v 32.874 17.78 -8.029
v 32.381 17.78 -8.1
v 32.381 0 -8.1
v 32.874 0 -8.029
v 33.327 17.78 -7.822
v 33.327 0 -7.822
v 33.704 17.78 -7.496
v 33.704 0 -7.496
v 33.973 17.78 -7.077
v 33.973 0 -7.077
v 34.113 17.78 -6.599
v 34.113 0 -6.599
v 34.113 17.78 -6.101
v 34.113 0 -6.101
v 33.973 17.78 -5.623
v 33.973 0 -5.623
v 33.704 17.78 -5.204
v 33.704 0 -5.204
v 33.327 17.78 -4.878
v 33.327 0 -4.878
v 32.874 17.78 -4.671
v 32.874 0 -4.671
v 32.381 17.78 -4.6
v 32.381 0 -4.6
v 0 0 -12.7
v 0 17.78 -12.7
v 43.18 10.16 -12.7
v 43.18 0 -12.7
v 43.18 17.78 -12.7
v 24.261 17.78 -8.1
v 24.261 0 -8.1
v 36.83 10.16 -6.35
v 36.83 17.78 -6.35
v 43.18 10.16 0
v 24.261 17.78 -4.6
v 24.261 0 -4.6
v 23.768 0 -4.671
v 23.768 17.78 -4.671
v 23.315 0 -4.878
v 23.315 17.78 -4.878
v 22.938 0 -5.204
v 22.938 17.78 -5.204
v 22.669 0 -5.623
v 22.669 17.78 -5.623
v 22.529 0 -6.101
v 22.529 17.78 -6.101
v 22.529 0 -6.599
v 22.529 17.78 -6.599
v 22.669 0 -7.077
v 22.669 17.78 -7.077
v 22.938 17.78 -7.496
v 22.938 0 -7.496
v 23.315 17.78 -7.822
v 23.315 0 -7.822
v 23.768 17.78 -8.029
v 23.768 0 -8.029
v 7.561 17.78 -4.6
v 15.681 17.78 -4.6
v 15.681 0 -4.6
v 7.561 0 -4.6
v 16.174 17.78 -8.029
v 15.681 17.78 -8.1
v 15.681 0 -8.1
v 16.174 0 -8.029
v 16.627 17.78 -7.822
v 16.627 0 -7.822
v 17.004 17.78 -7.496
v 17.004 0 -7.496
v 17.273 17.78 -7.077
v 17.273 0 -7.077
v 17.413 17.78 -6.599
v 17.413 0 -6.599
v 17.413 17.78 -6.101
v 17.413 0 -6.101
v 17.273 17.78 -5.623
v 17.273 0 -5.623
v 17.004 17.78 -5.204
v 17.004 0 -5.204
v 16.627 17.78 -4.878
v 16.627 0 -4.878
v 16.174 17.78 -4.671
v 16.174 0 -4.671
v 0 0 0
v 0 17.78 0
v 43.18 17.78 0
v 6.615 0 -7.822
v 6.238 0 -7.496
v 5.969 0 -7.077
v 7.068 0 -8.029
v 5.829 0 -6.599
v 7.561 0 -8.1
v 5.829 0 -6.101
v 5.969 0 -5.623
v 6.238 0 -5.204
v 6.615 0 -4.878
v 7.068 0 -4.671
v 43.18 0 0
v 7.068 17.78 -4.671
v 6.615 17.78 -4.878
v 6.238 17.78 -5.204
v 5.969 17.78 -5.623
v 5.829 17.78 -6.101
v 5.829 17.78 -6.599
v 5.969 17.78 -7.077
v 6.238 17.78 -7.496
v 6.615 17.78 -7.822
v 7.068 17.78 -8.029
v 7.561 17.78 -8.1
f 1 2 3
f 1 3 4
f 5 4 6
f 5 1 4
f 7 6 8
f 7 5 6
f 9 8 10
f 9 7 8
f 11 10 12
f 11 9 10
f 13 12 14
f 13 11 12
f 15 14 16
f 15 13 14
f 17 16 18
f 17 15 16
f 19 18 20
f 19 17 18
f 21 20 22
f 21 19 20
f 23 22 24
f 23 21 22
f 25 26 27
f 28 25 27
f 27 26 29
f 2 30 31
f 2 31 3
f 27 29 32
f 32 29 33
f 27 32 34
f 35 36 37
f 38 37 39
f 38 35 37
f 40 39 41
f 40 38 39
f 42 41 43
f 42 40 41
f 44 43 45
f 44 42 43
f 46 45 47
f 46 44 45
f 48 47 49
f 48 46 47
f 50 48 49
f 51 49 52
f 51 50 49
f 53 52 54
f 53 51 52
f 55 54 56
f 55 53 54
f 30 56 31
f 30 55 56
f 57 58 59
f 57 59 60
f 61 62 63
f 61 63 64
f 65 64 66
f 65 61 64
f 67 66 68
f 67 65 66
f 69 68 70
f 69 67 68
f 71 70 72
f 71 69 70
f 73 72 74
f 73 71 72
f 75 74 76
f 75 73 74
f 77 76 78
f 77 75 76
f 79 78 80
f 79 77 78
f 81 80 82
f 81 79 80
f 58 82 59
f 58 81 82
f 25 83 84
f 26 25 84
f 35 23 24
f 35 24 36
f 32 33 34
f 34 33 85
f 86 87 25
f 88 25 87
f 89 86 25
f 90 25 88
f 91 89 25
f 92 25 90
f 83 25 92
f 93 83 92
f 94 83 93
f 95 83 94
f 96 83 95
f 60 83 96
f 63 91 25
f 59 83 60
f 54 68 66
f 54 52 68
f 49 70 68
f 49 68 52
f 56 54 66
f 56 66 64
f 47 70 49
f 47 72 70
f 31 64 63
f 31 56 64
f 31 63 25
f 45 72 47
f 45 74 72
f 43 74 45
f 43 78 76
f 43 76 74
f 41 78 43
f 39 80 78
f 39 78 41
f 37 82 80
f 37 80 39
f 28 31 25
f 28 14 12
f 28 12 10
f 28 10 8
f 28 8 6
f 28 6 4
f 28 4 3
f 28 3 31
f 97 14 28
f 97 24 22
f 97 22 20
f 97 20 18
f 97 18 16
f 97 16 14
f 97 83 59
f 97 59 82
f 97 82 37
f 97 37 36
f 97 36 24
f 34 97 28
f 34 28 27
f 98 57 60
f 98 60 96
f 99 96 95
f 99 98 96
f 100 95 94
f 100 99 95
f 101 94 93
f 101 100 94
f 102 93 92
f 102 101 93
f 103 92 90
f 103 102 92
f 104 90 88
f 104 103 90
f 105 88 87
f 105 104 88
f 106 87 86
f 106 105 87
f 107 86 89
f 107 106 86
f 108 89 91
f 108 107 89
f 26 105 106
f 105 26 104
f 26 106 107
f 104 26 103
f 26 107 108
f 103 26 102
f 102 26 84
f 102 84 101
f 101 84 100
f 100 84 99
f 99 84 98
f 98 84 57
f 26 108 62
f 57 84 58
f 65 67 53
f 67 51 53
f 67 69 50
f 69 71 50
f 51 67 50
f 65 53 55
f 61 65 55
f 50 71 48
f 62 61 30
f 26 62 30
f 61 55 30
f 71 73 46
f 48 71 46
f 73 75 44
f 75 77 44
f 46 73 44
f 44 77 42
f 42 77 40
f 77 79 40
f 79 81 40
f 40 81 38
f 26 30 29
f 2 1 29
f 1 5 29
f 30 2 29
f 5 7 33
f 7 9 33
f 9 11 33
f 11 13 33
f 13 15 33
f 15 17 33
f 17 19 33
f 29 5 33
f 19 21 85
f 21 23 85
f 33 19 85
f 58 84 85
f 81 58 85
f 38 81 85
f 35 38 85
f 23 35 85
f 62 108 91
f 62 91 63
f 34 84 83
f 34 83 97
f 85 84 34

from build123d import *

# Parameters (mm, degrees)
SKETCH1_W           = 43.18
SKETCH1_H           = 17.78
BOSS_EXTRUDE1_DEPTH = 12.7
CUT_EXTRUDE1_DEPTH  = 7.62
CUT_EXTRUDE2_DEPTH  = 18.78


with BuildPart() as part:
    # Sketch1 → Boss-Extrude1 (new body)
    with BuildSketch(Plane.XY):
        with Locations((21.59, 8.89)):
            Rectangle(SKETCH1_W, SKETCH1_H)
    extrude(amount=-BOSS_EXTRUDE1_DEPTH)

    # Sketch3 → Cut-Extrude1 (cut)
    with BuildSketch(Plane(origin=(0, 17.78, 0), x_dir=(1, 0, 0), z_dir=(0, 1, 0))):
        Polygon((43.18, 12.7), (36.83, 6.35), (43.18, 0), align=None)
    extrude(amount=-CUT_EXTRUDE1_DEPTH, mode=Mode.SUBTRACT)

    # Sketch4 → Cut-Extrude2 (cut, through all)
    with BuildSketch(Plane(origin=(0, 17.78, 0), x_dir=(1, 0, 0), z_dir=(0, 1, 0))):
        with BuildLine():
            Line((32.381000008, 4.599999944), (24.260999992, 4.599999944))
            ThreePointArc((24.260999992, 4.599999944), (22.510999936, 6.35), (24.260999992, 8.100000056))
            Line((24.260999992, 8.100000056), (32.381000008, 8.100000056))
            ThreePointArc((32.381000008, 8.100000056), (34.131000064, 6.35), (32.381000008, 4.599999944))
        make_face()
        with BuildLine():
            Line((15.68099988, 4.599999944), (7.560999864, 4.599999944))
            ThreePointArc((7.560999864, 4.599999944), (5.810999808, 6.35), (7.560999864, 8.100000056))
            Line((7.560999864, 8.100000056), (15.68099988, 8.100000056))
            ThreePointArc((15.68099988, 8.100000056), (17.430999936, 6.35), (15.68099988, 4.599999944))
        make_face()
    extrude(amount=-CUT_EXTRUDE2_DEPTH, mode=Mode.SUBTRACT)


solid = part.part
